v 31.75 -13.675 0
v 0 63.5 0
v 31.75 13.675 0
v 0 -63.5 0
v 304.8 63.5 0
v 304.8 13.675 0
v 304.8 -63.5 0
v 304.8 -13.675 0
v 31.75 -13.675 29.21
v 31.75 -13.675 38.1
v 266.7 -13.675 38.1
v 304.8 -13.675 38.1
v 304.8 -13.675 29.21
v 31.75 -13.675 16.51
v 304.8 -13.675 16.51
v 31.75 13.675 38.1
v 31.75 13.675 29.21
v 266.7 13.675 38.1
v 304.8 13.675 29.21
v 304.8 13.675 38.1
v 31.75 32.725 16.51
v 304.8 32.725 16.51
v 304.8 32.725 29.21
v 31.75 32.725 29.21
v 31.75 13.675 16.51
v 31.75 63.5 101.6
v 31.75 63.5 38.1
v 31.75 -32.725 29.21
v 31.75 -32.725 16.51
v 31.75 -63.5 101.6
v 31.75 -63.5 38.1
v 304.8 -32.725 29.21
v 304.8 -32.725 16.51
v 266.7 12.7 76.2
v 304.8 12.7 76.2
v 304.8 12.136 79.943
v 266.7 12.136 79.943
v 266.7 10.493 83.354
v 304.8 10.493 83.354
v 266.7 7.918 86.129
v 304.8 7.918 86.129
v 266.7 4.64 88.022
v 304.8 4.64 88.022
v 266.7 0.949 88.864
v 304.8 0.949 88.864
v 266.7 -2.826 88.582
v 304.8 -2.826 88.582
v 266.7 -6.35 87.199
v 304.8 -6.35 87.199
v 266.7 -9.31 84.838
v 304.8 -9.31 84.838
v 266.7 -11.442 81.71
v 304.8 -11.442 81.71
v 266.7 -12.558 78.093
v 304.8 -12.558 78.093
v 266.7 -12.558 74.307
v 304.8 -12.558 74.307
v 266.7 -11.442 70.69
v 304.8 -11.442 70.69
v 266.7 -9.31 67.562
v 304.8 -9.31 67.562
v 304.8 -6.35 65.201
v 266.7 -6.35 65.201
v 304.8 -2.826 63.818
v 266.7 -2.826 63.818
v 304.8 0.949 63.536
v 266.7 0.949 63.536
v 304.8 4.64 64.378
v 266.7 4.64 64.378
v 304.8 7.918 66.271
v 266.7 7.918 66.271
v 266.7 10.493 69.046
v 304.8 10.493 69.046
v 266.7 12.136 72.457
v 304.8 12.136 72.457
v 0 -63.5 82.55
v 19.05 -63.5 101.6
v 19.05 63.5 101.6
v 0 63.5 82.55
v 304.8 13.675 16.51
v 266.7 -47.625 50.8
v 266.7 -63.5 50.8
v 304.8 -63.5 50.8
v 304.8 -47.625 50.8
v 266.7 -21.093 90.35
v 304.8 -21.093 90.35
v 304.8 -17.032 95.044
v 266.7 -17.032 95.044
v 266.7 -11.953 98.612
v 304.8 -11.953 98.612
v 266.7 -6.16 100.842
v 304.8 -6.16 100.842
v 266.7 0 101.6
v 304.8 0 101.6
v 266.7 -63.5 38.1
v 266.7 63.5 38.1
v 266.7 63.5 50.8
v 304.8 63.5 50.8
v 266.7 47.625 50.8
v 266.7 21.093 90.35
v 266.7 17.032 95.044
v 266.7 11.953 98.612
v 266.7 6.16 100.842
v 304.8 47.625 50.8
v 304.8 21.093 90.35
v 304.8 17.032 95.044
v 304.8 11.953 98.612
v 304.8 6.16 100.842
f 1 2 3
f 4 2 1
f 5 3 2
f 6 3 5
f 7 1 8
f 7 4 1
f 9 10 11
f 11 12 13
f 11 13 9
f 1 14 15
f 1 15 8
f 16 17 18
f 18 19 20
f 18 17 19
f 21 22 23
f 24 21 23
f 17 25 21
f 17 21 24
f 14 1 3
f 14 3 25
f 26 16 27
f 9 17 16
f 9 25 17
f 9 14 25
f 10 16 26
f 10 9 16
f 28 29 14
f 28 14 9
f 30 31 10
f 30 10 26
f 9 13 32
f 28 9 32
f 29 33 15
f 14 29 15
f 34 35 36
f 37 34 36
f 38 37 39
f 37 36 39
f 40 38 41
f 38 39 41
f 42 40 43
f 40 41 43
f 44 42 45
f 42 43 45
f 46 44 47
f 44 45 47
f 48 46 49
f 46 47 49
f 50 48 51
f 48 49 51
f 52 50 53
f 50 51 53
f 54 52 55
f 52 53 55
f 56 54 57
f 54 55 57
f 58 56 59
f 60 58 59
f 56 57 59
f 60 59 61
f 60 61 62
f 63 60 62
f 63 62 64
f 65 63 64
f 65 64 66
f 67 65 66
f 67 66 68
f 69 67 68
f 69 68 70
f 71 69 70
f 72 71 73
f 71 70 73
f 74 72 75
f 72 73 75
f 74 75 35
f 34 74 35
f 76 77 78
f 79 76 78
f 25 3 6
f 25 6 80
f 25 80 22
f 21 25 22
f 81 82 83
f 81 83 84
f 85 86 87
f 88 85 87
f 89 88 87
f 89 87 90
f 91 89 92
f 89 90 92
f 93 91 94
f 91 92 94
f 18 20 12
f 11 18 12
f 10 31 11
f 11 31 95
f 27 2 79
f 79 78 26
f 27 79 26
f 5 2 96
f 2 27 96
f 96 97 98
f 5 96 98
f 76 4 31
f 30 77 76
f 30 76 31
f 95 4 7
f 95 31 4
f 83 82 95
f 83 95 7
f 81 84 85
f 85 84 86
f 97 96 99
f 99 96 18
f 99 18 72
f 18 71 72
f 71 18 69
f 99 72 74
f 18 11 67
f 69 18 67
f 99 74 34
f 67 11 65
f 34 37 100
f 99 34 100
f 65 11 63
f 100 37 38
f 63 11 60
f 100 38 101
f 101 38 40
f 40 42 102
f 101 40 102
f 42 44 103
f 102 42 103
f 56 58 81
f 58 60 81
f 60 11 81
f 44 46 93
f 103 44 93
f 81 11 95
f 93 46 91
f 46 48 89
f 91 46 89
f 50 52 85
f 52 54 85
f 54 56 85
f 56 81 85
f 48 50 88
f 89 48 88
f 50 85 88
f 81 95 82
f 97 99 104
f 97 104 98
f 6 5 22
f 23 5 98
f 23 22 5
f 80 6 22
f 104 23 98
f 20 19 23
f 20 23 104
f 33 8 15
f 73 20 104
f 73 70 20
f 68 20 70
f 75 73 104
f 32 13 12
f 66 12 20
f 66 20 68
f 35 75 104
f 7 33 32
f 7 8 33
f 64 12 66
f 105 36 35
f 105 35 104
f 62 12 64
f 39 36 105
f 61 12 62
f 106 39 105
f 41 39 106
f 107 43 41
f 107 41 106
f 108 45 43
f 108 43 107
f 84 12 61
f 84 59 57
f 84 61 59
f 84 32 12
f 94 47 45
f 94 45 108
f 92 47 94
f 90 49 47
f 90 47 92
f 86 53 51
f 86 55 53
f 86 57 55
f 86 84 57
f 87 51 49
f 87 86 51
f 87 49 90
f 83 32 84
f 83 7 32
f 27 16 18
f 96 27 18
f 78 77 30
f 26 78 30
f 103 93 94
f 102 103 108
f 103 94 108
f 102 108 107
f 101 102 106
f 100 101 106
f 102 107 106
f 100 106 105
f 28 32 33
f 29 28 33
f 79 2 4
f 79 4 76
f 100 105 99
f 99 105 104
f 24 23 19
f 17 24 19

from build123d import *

# Parameters (mm, degrees)
F0_W     = 304.8
F0_H     = 101.6
F1_DEPTH = 63.5
F2_W     = 234.95
F2_H     = 63.5
F3_DEPTH = 127.001
F4_SIZE2 = 19.05
F4_SIZE  = 19.05
F5_R     = 12.7
F6_DEPTH = 38.1
F8_DEPTH = 273.05


with BuildPart() as f1:
    # F0 (on Front) → F1 (new body, symmetric)
    with BuildSketch(Plane.XZ):
        with Locations((152.4, 50.8)):
            Rectangle(F0_W, F0_H)
    extrude(amount=F1_DEPTH, both=True)

    # F2 (on face) → F3 (cut, through all)
    with BuildSketch(Plane.XZ.offset(63.5)):
        with Locations((149.225, 69.85)):
            Rectangle(F2_W, F2_H)
    extrude(amount=-F3_DEPTH, mode=Mode.SUBTRACT)

    # F4
    f4_edges = [f1.edges().sort_by_distance(p)[0] for p in [
        (0, 0, 101.6),
    ]]
    chamfer(f4_edges, length=F4_SIZE, length2=F4_SIZE2)

    # F5 (on face) → F6 (cut)
    with BuildSketch(Plane.YZ.offset(304.8)):
        with BuildLine():
            Line((-63.5, 101.6), (-63.5, 50.8))
            Line((-63.5, 50.8), (-47.625, 50.8))
            Line((-47.625, 50.8), (-21.093426, 90.350173))
            ThreePointArc((-21.093426, 90.350173), (-11.952941, 98.611765), (0, 101.6))
            Line((0, 101.6), (-63.5, 101.6))
        make_face()
        with BuildLine():
            Line((63.5, 101.6), (0, 101.6))
            ThreePointArc((0, 101.6), (11.952941, 98.611765), (21.093426, 90.350173))
            Line((21.093426, 90.350173), (47.625, 50.8))
            Line((47.625, 50.8), (63.5, 50.8))
            Line((63.5, 50.8), (63.5, 101.6))
        make_face()
        with Locations((0, 76.2)):
            Circle(F5_R)
    extrude(amount=-F6_DEPTH, mode=Mode.SUBTRACT)

    # F7 (on face) → F8 (cut)
    with BuildSketch(Plane.YZ.offset(304.8)):
        Polygon((-13.675422, 0), (0, 0), (13.675422, 0), (13.675422, 16.51), (32.725422, 16.51), (32.725422, 29.21), (13.675422, 29.21), (13.675422, 38.1), (0, 38.1), (-13.675422, 38.1), (-13.675422, 29.21), (-32.725422, 29.21), (-32.725422, 16.51), (-13.675422, 16.51), align=None)
    extrude(amount=-F8_DEPTH, mode=Mode.SUBTRACT)


solid = f1.part
